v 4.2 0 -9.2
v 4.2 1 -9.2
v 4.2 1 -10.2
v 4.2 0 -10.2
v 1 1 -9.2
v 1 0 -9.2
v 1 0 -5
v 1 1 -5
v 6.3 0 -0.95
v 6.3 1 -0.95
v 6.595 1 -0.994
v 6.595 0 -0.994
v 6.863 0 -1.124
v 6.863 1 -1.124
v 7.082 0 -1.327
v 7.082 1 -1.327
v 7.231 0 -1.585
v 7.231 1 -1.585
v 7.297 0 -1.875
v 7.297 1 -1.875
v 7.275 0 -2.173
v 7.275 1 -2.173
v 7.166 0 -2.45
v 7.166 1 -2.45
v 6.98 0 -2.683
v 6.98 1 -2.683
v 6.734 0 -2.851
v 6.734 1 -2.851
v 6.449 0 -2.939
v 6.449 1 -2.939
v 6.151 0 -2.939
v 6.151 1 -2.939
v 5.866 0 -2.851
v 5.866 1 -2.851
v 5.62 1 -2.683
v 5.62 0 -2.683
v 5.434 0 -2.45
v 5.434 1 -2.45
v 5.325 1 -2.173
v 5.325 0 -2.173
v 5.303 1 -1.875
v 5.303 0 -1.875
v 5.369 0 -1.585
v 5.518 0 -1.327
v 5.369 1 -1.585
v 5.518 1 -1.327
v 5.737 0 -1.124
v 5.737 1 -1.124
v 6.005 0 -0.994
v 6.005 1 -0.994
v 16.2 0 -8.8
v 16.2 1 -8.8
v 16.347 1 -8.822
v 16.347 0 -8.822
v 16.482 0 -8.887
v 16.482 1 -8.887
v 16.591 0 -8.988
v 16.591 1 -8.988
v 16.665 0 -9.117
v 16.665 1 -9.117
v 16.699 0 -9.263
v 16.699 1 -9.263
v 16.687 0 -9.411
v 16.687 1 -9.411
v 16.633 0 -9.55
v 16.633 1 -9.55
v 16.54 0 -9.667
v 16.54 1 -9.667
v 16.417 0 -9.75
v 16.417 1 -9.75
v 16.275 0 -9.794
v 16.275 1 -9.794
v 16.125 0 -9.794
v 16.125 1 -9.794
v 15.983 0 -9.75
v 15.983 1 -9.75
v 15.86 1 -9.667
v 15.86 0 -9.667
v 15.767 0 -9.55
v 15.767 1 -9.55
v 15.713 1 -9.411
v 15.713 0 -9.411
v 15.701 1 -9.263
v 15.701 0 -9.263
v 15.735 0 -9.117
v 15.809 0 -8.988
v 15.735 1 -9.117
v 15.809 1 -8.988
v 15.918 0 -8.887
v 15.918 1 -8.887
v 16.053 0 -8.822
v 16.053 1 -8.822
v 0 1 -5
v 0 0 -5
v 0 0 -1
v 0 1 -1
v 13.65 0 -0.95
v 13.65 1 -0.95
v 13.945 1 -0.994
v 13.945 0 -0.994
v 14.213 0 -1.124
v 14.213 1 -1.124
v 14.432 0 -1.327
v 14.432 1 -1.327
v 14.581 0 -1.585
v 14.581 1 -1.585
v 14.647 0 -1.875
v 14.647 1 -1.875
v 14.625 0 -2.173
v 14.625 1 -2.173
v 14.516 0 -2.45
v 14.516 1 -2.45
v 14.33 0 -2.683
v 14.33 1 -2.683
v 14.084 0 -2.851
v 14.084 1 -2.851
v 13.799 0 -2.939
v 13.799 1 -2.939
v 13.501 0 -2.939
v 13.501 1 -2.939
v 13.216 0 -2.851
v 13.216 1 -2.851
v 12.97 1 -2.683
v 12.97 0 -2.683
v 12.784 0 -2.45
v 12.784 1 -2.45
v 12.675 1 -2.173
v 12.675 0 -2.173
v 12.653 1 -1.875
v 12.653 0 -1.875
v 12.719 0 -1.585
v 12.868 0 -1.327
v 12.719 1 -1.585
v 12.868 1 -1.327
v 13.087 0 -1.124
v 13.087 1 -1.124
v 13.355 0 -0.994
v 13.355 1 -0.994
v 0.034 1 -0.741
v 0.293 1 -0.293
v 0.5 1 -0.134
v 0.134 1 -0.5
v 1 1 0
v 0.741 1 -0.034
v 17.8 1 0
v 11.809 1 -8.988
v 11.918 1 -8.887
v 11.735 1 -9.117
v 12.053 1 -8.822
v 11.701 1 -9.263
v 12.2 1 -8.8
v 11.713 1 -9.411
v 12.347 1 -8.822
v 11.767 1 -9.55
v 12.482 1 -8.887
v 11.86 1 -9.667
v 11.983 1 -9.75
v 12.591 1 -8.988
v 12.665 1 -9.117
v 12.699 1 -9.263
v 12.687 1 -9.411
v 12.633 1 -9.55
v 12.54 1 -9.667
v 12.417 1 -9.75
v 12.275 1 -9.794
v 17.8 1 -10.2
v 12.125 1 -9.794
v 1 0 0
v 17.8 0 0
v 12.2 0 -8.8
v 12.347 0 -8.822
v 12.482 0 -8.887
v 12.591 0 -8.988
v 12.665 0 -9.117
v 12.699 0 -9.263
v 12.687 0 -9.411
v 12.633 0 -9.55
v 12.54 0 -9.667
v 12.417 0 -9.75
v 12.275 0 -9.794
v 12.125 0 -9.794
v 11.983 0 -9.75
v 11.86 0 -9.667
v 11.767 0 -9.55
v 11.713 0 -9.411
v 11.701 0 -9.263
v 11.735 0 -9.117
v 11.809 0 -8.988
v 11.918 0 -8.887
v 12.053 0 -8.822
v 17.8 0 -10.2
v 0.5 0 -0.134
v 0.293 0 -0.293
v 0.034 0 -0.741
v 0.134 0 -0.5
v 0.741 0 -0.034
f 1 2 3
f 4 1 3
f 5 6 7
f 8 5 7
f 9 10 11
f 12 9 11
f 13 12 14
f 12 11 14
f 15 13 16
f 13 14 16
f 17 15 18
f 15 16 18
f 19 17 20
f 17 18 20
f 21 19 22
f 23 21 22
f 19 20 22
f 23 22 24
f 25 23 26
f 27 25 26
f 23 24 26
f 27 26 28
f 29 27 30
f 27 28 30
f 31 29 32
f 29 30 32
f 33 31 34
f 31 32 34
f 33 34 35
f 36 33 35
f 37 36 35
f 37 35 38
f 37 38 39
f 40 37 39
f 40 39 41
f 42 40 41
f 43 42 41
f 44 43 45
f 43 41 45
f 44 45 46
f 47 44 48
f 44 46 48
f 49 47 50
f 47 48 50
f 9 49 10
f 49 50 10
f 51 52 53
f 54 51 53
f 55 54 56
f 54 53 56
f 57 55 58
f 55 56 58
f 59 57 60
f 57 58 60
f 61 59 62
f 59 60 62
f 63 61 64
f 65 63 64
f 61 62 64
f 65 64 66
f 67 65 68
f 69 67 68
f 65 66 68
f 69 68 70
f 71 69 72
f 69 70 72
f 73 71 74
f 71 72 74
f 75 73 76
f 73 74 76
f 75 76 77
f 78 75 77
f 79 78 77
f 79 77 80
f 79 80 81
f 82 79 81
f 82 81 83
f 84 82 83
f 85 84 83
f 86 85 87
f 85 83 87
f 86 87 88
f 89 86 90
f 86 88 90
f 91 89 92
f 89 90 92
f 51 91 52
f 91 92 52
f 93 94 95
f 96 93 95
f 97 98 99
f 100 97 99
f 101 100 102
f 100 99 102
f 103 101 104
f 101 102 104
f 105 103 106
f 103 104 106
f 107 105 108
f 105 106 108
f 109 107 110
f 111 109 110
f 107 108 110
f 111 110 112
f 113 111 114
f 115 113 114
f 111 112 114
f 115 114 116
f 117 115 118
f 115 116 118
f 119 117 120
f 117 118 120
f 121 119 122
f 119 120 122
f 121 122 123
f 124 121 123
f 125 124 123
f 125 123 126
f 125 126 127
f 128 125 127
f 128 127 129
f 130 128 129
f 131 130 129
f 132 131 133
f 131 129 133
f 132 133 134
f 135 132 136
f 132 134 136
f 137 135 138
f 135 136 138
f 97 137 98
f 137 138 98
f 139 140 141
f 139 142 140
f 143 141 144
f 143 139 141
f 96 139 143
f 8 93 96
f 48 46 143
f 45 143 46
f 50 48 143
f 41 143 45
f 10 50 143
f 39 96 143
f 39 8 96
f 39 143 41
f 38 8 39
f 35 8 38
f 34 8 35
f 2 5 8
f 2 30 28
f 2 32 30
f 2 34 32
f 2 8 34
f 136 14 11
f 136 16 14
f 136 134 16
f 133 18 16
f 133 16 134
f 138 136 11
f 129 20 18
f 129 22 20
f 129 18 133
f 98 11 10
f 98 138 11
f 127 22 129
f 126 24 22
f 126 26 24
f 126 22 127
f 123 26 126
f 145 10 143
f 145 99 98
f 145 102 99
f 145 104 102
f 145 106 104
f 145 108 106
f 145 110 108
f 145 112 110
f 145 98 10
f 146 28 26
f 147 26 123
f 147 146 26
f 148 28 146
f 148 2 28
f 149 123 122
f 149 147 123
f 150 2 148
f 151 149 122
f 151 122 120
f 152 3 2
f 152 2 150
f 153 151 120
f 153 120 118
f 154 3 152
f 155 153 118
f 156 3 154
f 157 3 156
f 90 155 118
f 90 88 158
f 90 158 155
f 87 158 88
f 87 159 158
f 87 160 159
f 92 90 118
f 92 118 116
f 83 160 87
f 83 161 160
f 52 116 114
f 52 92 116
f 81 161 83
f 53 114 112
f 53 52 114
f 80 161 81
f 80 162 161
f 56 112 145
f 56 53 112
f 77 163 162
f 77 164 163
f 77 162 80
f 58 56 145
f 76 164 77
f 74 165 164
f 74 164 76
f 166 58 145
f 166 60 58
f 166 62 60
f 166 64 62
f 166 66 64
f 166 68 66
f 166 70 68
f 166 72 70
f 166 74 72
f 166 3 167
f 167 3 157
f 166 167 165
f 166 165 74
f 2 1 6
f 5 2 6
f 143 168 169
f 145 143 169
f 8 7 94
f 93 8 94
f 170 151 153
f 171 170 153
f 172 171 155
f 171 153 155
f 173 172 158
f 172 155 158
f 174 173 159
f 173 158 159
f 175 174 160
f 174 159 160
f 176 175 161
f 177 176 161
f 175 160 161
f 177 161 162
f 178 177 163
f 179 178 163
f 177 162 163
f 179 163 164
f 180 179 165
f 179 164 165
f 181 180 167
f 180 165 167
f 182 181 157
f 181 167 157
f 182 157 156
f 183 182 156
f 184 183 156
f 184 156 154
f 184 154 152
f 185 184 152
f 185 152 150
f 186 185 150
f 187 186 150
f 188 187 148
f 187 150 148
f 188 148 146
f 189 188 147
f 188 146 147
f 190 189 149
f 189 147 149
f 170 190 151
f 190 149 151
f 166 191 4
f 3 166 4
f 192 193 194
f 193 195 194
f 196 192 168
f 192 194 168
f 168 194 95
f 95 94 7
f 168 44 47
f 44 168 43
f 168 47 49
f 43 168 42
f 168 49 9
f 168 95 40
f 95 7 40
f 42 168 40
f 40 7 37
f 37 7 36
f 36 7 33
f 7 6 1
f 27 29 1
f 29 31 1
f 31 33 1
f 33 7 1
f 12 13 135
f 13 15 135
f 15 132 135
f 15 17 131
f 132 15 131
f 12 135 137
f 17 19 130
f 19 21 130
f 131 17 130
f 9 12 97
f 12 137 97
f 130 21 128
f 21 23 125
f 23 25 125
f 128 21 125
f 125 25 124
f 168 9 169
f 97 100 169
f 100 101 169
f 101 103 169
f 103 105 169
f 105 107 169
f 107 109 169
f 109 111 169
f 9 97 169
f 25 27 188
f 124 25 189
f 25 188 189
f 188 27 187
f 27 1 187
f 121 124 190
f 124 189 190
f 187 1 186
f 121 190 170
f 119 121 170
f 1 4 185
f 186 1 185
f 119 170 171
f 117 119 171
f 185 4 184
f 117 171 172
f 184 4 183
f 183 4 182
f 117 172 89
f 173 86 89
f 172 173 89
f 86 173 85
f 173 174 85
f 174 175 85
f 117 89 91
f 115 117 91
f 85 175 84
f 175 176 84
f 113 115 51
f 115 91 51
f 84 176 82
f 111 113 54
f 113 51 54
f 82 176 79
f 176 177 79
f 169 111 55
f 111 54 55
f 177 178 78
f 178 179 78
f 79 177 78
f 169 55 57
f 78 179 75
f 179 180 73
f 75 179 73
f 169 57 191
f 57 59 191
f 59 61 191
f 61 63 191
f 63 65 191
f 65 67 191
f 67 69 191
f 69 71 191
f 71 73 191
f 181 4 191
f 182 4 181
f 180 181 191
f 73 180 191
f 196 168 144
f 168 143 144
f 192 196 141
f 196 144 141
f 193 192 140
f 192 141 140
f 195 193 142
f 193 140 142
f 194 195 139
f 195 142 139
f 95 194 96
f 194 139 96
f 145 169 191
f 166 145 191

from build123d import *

# Parameters (mm, degrees)
DODANIE_WYCI_GNI_CIE1_DEPTH = 1
SZKIC2_R                    = 0.5
SZKIC2_R_2                  = 1
WYTNIJ_WYCI_GNI_CIE1_DEPTH  = 1
ZAOKR_GLENIE1_R             = 1
SZKIC3_W                    = 1
SZKIC3_H                    = 1
WYTNIJ_WYCI_GNI_CIE2_DEPTH  = 10


with BuildPart() as part:
    # Szkic1 → Dodanie-wyciągnięcie1 (new body)
    with BuildSketch(Plane(origin=(0, 0, 0), x_dir=(1, 0, 0), z_dir=(0, 1, 0))):
        Polygon((0, 0), (17.8, 0), (17.8, 10.2), (3.2, 10.2), (3.2, 9.2), (1, 9.2), (1, 5), (0, 5), align=None)
    extrude(amount=DODANIE_WYCI_GNI_CIE1_DEPTH)

    # Szkic2 → Wytnij-wyciągnięcie1 (cut)
    with BuildSketch(Plane(origin=(0, 1, 0), x_dir=(1, 0, 0), z_dir=(0, 1, 0))):
        with Locations(Location((12.2, 9.3, 0), (0, 0, 270))):
            Circle(SZKIC2_R)
        with Locations(Location((16.2, 9.3, 0), (0, 0, 270))):
            Circle(SZKIC2_R)
        with Locations(Location((6.3, 1.95, 0), (0, 0, 270))):
            Circle(SZKIC2_R_2)
        with Locations(Location((13.65, 1.95, 0), (0, 0, 270))):
            Circle(SZKIC2_R_2)
    extrude(amount=-WYTNIJ_WYCI_GNI_CIE1_DEPTH, mode=Mode.SUBTRACT)

    # Zaokrąglenie1
    zaokr_glenie1_edges = [part.edges().sort_by_distance(p)[0] for p in [
        (0, 0.5, 0),
    ]]
    fillet(zaokr_glenie1_edges, radius=ZAOKR_GLENIE1_R)

    # Szkic3 → Wytnij-wyciągnięcie2 (cut)
    with BuildSketch(Plane(origin=(0, 1, 0), x_dir=(1, 0, 0), z_dir=(0, 1, 0))):
        with Locations((3.7, 9.7)):
            Rectangle(SZKIC3_W, SZKIC3_H)
    extrude(amount=-WYTNIJ_WYCI_GNI_CIE2_DEPTH, mode=Mode.SUBTRACT)


solid = part.part
